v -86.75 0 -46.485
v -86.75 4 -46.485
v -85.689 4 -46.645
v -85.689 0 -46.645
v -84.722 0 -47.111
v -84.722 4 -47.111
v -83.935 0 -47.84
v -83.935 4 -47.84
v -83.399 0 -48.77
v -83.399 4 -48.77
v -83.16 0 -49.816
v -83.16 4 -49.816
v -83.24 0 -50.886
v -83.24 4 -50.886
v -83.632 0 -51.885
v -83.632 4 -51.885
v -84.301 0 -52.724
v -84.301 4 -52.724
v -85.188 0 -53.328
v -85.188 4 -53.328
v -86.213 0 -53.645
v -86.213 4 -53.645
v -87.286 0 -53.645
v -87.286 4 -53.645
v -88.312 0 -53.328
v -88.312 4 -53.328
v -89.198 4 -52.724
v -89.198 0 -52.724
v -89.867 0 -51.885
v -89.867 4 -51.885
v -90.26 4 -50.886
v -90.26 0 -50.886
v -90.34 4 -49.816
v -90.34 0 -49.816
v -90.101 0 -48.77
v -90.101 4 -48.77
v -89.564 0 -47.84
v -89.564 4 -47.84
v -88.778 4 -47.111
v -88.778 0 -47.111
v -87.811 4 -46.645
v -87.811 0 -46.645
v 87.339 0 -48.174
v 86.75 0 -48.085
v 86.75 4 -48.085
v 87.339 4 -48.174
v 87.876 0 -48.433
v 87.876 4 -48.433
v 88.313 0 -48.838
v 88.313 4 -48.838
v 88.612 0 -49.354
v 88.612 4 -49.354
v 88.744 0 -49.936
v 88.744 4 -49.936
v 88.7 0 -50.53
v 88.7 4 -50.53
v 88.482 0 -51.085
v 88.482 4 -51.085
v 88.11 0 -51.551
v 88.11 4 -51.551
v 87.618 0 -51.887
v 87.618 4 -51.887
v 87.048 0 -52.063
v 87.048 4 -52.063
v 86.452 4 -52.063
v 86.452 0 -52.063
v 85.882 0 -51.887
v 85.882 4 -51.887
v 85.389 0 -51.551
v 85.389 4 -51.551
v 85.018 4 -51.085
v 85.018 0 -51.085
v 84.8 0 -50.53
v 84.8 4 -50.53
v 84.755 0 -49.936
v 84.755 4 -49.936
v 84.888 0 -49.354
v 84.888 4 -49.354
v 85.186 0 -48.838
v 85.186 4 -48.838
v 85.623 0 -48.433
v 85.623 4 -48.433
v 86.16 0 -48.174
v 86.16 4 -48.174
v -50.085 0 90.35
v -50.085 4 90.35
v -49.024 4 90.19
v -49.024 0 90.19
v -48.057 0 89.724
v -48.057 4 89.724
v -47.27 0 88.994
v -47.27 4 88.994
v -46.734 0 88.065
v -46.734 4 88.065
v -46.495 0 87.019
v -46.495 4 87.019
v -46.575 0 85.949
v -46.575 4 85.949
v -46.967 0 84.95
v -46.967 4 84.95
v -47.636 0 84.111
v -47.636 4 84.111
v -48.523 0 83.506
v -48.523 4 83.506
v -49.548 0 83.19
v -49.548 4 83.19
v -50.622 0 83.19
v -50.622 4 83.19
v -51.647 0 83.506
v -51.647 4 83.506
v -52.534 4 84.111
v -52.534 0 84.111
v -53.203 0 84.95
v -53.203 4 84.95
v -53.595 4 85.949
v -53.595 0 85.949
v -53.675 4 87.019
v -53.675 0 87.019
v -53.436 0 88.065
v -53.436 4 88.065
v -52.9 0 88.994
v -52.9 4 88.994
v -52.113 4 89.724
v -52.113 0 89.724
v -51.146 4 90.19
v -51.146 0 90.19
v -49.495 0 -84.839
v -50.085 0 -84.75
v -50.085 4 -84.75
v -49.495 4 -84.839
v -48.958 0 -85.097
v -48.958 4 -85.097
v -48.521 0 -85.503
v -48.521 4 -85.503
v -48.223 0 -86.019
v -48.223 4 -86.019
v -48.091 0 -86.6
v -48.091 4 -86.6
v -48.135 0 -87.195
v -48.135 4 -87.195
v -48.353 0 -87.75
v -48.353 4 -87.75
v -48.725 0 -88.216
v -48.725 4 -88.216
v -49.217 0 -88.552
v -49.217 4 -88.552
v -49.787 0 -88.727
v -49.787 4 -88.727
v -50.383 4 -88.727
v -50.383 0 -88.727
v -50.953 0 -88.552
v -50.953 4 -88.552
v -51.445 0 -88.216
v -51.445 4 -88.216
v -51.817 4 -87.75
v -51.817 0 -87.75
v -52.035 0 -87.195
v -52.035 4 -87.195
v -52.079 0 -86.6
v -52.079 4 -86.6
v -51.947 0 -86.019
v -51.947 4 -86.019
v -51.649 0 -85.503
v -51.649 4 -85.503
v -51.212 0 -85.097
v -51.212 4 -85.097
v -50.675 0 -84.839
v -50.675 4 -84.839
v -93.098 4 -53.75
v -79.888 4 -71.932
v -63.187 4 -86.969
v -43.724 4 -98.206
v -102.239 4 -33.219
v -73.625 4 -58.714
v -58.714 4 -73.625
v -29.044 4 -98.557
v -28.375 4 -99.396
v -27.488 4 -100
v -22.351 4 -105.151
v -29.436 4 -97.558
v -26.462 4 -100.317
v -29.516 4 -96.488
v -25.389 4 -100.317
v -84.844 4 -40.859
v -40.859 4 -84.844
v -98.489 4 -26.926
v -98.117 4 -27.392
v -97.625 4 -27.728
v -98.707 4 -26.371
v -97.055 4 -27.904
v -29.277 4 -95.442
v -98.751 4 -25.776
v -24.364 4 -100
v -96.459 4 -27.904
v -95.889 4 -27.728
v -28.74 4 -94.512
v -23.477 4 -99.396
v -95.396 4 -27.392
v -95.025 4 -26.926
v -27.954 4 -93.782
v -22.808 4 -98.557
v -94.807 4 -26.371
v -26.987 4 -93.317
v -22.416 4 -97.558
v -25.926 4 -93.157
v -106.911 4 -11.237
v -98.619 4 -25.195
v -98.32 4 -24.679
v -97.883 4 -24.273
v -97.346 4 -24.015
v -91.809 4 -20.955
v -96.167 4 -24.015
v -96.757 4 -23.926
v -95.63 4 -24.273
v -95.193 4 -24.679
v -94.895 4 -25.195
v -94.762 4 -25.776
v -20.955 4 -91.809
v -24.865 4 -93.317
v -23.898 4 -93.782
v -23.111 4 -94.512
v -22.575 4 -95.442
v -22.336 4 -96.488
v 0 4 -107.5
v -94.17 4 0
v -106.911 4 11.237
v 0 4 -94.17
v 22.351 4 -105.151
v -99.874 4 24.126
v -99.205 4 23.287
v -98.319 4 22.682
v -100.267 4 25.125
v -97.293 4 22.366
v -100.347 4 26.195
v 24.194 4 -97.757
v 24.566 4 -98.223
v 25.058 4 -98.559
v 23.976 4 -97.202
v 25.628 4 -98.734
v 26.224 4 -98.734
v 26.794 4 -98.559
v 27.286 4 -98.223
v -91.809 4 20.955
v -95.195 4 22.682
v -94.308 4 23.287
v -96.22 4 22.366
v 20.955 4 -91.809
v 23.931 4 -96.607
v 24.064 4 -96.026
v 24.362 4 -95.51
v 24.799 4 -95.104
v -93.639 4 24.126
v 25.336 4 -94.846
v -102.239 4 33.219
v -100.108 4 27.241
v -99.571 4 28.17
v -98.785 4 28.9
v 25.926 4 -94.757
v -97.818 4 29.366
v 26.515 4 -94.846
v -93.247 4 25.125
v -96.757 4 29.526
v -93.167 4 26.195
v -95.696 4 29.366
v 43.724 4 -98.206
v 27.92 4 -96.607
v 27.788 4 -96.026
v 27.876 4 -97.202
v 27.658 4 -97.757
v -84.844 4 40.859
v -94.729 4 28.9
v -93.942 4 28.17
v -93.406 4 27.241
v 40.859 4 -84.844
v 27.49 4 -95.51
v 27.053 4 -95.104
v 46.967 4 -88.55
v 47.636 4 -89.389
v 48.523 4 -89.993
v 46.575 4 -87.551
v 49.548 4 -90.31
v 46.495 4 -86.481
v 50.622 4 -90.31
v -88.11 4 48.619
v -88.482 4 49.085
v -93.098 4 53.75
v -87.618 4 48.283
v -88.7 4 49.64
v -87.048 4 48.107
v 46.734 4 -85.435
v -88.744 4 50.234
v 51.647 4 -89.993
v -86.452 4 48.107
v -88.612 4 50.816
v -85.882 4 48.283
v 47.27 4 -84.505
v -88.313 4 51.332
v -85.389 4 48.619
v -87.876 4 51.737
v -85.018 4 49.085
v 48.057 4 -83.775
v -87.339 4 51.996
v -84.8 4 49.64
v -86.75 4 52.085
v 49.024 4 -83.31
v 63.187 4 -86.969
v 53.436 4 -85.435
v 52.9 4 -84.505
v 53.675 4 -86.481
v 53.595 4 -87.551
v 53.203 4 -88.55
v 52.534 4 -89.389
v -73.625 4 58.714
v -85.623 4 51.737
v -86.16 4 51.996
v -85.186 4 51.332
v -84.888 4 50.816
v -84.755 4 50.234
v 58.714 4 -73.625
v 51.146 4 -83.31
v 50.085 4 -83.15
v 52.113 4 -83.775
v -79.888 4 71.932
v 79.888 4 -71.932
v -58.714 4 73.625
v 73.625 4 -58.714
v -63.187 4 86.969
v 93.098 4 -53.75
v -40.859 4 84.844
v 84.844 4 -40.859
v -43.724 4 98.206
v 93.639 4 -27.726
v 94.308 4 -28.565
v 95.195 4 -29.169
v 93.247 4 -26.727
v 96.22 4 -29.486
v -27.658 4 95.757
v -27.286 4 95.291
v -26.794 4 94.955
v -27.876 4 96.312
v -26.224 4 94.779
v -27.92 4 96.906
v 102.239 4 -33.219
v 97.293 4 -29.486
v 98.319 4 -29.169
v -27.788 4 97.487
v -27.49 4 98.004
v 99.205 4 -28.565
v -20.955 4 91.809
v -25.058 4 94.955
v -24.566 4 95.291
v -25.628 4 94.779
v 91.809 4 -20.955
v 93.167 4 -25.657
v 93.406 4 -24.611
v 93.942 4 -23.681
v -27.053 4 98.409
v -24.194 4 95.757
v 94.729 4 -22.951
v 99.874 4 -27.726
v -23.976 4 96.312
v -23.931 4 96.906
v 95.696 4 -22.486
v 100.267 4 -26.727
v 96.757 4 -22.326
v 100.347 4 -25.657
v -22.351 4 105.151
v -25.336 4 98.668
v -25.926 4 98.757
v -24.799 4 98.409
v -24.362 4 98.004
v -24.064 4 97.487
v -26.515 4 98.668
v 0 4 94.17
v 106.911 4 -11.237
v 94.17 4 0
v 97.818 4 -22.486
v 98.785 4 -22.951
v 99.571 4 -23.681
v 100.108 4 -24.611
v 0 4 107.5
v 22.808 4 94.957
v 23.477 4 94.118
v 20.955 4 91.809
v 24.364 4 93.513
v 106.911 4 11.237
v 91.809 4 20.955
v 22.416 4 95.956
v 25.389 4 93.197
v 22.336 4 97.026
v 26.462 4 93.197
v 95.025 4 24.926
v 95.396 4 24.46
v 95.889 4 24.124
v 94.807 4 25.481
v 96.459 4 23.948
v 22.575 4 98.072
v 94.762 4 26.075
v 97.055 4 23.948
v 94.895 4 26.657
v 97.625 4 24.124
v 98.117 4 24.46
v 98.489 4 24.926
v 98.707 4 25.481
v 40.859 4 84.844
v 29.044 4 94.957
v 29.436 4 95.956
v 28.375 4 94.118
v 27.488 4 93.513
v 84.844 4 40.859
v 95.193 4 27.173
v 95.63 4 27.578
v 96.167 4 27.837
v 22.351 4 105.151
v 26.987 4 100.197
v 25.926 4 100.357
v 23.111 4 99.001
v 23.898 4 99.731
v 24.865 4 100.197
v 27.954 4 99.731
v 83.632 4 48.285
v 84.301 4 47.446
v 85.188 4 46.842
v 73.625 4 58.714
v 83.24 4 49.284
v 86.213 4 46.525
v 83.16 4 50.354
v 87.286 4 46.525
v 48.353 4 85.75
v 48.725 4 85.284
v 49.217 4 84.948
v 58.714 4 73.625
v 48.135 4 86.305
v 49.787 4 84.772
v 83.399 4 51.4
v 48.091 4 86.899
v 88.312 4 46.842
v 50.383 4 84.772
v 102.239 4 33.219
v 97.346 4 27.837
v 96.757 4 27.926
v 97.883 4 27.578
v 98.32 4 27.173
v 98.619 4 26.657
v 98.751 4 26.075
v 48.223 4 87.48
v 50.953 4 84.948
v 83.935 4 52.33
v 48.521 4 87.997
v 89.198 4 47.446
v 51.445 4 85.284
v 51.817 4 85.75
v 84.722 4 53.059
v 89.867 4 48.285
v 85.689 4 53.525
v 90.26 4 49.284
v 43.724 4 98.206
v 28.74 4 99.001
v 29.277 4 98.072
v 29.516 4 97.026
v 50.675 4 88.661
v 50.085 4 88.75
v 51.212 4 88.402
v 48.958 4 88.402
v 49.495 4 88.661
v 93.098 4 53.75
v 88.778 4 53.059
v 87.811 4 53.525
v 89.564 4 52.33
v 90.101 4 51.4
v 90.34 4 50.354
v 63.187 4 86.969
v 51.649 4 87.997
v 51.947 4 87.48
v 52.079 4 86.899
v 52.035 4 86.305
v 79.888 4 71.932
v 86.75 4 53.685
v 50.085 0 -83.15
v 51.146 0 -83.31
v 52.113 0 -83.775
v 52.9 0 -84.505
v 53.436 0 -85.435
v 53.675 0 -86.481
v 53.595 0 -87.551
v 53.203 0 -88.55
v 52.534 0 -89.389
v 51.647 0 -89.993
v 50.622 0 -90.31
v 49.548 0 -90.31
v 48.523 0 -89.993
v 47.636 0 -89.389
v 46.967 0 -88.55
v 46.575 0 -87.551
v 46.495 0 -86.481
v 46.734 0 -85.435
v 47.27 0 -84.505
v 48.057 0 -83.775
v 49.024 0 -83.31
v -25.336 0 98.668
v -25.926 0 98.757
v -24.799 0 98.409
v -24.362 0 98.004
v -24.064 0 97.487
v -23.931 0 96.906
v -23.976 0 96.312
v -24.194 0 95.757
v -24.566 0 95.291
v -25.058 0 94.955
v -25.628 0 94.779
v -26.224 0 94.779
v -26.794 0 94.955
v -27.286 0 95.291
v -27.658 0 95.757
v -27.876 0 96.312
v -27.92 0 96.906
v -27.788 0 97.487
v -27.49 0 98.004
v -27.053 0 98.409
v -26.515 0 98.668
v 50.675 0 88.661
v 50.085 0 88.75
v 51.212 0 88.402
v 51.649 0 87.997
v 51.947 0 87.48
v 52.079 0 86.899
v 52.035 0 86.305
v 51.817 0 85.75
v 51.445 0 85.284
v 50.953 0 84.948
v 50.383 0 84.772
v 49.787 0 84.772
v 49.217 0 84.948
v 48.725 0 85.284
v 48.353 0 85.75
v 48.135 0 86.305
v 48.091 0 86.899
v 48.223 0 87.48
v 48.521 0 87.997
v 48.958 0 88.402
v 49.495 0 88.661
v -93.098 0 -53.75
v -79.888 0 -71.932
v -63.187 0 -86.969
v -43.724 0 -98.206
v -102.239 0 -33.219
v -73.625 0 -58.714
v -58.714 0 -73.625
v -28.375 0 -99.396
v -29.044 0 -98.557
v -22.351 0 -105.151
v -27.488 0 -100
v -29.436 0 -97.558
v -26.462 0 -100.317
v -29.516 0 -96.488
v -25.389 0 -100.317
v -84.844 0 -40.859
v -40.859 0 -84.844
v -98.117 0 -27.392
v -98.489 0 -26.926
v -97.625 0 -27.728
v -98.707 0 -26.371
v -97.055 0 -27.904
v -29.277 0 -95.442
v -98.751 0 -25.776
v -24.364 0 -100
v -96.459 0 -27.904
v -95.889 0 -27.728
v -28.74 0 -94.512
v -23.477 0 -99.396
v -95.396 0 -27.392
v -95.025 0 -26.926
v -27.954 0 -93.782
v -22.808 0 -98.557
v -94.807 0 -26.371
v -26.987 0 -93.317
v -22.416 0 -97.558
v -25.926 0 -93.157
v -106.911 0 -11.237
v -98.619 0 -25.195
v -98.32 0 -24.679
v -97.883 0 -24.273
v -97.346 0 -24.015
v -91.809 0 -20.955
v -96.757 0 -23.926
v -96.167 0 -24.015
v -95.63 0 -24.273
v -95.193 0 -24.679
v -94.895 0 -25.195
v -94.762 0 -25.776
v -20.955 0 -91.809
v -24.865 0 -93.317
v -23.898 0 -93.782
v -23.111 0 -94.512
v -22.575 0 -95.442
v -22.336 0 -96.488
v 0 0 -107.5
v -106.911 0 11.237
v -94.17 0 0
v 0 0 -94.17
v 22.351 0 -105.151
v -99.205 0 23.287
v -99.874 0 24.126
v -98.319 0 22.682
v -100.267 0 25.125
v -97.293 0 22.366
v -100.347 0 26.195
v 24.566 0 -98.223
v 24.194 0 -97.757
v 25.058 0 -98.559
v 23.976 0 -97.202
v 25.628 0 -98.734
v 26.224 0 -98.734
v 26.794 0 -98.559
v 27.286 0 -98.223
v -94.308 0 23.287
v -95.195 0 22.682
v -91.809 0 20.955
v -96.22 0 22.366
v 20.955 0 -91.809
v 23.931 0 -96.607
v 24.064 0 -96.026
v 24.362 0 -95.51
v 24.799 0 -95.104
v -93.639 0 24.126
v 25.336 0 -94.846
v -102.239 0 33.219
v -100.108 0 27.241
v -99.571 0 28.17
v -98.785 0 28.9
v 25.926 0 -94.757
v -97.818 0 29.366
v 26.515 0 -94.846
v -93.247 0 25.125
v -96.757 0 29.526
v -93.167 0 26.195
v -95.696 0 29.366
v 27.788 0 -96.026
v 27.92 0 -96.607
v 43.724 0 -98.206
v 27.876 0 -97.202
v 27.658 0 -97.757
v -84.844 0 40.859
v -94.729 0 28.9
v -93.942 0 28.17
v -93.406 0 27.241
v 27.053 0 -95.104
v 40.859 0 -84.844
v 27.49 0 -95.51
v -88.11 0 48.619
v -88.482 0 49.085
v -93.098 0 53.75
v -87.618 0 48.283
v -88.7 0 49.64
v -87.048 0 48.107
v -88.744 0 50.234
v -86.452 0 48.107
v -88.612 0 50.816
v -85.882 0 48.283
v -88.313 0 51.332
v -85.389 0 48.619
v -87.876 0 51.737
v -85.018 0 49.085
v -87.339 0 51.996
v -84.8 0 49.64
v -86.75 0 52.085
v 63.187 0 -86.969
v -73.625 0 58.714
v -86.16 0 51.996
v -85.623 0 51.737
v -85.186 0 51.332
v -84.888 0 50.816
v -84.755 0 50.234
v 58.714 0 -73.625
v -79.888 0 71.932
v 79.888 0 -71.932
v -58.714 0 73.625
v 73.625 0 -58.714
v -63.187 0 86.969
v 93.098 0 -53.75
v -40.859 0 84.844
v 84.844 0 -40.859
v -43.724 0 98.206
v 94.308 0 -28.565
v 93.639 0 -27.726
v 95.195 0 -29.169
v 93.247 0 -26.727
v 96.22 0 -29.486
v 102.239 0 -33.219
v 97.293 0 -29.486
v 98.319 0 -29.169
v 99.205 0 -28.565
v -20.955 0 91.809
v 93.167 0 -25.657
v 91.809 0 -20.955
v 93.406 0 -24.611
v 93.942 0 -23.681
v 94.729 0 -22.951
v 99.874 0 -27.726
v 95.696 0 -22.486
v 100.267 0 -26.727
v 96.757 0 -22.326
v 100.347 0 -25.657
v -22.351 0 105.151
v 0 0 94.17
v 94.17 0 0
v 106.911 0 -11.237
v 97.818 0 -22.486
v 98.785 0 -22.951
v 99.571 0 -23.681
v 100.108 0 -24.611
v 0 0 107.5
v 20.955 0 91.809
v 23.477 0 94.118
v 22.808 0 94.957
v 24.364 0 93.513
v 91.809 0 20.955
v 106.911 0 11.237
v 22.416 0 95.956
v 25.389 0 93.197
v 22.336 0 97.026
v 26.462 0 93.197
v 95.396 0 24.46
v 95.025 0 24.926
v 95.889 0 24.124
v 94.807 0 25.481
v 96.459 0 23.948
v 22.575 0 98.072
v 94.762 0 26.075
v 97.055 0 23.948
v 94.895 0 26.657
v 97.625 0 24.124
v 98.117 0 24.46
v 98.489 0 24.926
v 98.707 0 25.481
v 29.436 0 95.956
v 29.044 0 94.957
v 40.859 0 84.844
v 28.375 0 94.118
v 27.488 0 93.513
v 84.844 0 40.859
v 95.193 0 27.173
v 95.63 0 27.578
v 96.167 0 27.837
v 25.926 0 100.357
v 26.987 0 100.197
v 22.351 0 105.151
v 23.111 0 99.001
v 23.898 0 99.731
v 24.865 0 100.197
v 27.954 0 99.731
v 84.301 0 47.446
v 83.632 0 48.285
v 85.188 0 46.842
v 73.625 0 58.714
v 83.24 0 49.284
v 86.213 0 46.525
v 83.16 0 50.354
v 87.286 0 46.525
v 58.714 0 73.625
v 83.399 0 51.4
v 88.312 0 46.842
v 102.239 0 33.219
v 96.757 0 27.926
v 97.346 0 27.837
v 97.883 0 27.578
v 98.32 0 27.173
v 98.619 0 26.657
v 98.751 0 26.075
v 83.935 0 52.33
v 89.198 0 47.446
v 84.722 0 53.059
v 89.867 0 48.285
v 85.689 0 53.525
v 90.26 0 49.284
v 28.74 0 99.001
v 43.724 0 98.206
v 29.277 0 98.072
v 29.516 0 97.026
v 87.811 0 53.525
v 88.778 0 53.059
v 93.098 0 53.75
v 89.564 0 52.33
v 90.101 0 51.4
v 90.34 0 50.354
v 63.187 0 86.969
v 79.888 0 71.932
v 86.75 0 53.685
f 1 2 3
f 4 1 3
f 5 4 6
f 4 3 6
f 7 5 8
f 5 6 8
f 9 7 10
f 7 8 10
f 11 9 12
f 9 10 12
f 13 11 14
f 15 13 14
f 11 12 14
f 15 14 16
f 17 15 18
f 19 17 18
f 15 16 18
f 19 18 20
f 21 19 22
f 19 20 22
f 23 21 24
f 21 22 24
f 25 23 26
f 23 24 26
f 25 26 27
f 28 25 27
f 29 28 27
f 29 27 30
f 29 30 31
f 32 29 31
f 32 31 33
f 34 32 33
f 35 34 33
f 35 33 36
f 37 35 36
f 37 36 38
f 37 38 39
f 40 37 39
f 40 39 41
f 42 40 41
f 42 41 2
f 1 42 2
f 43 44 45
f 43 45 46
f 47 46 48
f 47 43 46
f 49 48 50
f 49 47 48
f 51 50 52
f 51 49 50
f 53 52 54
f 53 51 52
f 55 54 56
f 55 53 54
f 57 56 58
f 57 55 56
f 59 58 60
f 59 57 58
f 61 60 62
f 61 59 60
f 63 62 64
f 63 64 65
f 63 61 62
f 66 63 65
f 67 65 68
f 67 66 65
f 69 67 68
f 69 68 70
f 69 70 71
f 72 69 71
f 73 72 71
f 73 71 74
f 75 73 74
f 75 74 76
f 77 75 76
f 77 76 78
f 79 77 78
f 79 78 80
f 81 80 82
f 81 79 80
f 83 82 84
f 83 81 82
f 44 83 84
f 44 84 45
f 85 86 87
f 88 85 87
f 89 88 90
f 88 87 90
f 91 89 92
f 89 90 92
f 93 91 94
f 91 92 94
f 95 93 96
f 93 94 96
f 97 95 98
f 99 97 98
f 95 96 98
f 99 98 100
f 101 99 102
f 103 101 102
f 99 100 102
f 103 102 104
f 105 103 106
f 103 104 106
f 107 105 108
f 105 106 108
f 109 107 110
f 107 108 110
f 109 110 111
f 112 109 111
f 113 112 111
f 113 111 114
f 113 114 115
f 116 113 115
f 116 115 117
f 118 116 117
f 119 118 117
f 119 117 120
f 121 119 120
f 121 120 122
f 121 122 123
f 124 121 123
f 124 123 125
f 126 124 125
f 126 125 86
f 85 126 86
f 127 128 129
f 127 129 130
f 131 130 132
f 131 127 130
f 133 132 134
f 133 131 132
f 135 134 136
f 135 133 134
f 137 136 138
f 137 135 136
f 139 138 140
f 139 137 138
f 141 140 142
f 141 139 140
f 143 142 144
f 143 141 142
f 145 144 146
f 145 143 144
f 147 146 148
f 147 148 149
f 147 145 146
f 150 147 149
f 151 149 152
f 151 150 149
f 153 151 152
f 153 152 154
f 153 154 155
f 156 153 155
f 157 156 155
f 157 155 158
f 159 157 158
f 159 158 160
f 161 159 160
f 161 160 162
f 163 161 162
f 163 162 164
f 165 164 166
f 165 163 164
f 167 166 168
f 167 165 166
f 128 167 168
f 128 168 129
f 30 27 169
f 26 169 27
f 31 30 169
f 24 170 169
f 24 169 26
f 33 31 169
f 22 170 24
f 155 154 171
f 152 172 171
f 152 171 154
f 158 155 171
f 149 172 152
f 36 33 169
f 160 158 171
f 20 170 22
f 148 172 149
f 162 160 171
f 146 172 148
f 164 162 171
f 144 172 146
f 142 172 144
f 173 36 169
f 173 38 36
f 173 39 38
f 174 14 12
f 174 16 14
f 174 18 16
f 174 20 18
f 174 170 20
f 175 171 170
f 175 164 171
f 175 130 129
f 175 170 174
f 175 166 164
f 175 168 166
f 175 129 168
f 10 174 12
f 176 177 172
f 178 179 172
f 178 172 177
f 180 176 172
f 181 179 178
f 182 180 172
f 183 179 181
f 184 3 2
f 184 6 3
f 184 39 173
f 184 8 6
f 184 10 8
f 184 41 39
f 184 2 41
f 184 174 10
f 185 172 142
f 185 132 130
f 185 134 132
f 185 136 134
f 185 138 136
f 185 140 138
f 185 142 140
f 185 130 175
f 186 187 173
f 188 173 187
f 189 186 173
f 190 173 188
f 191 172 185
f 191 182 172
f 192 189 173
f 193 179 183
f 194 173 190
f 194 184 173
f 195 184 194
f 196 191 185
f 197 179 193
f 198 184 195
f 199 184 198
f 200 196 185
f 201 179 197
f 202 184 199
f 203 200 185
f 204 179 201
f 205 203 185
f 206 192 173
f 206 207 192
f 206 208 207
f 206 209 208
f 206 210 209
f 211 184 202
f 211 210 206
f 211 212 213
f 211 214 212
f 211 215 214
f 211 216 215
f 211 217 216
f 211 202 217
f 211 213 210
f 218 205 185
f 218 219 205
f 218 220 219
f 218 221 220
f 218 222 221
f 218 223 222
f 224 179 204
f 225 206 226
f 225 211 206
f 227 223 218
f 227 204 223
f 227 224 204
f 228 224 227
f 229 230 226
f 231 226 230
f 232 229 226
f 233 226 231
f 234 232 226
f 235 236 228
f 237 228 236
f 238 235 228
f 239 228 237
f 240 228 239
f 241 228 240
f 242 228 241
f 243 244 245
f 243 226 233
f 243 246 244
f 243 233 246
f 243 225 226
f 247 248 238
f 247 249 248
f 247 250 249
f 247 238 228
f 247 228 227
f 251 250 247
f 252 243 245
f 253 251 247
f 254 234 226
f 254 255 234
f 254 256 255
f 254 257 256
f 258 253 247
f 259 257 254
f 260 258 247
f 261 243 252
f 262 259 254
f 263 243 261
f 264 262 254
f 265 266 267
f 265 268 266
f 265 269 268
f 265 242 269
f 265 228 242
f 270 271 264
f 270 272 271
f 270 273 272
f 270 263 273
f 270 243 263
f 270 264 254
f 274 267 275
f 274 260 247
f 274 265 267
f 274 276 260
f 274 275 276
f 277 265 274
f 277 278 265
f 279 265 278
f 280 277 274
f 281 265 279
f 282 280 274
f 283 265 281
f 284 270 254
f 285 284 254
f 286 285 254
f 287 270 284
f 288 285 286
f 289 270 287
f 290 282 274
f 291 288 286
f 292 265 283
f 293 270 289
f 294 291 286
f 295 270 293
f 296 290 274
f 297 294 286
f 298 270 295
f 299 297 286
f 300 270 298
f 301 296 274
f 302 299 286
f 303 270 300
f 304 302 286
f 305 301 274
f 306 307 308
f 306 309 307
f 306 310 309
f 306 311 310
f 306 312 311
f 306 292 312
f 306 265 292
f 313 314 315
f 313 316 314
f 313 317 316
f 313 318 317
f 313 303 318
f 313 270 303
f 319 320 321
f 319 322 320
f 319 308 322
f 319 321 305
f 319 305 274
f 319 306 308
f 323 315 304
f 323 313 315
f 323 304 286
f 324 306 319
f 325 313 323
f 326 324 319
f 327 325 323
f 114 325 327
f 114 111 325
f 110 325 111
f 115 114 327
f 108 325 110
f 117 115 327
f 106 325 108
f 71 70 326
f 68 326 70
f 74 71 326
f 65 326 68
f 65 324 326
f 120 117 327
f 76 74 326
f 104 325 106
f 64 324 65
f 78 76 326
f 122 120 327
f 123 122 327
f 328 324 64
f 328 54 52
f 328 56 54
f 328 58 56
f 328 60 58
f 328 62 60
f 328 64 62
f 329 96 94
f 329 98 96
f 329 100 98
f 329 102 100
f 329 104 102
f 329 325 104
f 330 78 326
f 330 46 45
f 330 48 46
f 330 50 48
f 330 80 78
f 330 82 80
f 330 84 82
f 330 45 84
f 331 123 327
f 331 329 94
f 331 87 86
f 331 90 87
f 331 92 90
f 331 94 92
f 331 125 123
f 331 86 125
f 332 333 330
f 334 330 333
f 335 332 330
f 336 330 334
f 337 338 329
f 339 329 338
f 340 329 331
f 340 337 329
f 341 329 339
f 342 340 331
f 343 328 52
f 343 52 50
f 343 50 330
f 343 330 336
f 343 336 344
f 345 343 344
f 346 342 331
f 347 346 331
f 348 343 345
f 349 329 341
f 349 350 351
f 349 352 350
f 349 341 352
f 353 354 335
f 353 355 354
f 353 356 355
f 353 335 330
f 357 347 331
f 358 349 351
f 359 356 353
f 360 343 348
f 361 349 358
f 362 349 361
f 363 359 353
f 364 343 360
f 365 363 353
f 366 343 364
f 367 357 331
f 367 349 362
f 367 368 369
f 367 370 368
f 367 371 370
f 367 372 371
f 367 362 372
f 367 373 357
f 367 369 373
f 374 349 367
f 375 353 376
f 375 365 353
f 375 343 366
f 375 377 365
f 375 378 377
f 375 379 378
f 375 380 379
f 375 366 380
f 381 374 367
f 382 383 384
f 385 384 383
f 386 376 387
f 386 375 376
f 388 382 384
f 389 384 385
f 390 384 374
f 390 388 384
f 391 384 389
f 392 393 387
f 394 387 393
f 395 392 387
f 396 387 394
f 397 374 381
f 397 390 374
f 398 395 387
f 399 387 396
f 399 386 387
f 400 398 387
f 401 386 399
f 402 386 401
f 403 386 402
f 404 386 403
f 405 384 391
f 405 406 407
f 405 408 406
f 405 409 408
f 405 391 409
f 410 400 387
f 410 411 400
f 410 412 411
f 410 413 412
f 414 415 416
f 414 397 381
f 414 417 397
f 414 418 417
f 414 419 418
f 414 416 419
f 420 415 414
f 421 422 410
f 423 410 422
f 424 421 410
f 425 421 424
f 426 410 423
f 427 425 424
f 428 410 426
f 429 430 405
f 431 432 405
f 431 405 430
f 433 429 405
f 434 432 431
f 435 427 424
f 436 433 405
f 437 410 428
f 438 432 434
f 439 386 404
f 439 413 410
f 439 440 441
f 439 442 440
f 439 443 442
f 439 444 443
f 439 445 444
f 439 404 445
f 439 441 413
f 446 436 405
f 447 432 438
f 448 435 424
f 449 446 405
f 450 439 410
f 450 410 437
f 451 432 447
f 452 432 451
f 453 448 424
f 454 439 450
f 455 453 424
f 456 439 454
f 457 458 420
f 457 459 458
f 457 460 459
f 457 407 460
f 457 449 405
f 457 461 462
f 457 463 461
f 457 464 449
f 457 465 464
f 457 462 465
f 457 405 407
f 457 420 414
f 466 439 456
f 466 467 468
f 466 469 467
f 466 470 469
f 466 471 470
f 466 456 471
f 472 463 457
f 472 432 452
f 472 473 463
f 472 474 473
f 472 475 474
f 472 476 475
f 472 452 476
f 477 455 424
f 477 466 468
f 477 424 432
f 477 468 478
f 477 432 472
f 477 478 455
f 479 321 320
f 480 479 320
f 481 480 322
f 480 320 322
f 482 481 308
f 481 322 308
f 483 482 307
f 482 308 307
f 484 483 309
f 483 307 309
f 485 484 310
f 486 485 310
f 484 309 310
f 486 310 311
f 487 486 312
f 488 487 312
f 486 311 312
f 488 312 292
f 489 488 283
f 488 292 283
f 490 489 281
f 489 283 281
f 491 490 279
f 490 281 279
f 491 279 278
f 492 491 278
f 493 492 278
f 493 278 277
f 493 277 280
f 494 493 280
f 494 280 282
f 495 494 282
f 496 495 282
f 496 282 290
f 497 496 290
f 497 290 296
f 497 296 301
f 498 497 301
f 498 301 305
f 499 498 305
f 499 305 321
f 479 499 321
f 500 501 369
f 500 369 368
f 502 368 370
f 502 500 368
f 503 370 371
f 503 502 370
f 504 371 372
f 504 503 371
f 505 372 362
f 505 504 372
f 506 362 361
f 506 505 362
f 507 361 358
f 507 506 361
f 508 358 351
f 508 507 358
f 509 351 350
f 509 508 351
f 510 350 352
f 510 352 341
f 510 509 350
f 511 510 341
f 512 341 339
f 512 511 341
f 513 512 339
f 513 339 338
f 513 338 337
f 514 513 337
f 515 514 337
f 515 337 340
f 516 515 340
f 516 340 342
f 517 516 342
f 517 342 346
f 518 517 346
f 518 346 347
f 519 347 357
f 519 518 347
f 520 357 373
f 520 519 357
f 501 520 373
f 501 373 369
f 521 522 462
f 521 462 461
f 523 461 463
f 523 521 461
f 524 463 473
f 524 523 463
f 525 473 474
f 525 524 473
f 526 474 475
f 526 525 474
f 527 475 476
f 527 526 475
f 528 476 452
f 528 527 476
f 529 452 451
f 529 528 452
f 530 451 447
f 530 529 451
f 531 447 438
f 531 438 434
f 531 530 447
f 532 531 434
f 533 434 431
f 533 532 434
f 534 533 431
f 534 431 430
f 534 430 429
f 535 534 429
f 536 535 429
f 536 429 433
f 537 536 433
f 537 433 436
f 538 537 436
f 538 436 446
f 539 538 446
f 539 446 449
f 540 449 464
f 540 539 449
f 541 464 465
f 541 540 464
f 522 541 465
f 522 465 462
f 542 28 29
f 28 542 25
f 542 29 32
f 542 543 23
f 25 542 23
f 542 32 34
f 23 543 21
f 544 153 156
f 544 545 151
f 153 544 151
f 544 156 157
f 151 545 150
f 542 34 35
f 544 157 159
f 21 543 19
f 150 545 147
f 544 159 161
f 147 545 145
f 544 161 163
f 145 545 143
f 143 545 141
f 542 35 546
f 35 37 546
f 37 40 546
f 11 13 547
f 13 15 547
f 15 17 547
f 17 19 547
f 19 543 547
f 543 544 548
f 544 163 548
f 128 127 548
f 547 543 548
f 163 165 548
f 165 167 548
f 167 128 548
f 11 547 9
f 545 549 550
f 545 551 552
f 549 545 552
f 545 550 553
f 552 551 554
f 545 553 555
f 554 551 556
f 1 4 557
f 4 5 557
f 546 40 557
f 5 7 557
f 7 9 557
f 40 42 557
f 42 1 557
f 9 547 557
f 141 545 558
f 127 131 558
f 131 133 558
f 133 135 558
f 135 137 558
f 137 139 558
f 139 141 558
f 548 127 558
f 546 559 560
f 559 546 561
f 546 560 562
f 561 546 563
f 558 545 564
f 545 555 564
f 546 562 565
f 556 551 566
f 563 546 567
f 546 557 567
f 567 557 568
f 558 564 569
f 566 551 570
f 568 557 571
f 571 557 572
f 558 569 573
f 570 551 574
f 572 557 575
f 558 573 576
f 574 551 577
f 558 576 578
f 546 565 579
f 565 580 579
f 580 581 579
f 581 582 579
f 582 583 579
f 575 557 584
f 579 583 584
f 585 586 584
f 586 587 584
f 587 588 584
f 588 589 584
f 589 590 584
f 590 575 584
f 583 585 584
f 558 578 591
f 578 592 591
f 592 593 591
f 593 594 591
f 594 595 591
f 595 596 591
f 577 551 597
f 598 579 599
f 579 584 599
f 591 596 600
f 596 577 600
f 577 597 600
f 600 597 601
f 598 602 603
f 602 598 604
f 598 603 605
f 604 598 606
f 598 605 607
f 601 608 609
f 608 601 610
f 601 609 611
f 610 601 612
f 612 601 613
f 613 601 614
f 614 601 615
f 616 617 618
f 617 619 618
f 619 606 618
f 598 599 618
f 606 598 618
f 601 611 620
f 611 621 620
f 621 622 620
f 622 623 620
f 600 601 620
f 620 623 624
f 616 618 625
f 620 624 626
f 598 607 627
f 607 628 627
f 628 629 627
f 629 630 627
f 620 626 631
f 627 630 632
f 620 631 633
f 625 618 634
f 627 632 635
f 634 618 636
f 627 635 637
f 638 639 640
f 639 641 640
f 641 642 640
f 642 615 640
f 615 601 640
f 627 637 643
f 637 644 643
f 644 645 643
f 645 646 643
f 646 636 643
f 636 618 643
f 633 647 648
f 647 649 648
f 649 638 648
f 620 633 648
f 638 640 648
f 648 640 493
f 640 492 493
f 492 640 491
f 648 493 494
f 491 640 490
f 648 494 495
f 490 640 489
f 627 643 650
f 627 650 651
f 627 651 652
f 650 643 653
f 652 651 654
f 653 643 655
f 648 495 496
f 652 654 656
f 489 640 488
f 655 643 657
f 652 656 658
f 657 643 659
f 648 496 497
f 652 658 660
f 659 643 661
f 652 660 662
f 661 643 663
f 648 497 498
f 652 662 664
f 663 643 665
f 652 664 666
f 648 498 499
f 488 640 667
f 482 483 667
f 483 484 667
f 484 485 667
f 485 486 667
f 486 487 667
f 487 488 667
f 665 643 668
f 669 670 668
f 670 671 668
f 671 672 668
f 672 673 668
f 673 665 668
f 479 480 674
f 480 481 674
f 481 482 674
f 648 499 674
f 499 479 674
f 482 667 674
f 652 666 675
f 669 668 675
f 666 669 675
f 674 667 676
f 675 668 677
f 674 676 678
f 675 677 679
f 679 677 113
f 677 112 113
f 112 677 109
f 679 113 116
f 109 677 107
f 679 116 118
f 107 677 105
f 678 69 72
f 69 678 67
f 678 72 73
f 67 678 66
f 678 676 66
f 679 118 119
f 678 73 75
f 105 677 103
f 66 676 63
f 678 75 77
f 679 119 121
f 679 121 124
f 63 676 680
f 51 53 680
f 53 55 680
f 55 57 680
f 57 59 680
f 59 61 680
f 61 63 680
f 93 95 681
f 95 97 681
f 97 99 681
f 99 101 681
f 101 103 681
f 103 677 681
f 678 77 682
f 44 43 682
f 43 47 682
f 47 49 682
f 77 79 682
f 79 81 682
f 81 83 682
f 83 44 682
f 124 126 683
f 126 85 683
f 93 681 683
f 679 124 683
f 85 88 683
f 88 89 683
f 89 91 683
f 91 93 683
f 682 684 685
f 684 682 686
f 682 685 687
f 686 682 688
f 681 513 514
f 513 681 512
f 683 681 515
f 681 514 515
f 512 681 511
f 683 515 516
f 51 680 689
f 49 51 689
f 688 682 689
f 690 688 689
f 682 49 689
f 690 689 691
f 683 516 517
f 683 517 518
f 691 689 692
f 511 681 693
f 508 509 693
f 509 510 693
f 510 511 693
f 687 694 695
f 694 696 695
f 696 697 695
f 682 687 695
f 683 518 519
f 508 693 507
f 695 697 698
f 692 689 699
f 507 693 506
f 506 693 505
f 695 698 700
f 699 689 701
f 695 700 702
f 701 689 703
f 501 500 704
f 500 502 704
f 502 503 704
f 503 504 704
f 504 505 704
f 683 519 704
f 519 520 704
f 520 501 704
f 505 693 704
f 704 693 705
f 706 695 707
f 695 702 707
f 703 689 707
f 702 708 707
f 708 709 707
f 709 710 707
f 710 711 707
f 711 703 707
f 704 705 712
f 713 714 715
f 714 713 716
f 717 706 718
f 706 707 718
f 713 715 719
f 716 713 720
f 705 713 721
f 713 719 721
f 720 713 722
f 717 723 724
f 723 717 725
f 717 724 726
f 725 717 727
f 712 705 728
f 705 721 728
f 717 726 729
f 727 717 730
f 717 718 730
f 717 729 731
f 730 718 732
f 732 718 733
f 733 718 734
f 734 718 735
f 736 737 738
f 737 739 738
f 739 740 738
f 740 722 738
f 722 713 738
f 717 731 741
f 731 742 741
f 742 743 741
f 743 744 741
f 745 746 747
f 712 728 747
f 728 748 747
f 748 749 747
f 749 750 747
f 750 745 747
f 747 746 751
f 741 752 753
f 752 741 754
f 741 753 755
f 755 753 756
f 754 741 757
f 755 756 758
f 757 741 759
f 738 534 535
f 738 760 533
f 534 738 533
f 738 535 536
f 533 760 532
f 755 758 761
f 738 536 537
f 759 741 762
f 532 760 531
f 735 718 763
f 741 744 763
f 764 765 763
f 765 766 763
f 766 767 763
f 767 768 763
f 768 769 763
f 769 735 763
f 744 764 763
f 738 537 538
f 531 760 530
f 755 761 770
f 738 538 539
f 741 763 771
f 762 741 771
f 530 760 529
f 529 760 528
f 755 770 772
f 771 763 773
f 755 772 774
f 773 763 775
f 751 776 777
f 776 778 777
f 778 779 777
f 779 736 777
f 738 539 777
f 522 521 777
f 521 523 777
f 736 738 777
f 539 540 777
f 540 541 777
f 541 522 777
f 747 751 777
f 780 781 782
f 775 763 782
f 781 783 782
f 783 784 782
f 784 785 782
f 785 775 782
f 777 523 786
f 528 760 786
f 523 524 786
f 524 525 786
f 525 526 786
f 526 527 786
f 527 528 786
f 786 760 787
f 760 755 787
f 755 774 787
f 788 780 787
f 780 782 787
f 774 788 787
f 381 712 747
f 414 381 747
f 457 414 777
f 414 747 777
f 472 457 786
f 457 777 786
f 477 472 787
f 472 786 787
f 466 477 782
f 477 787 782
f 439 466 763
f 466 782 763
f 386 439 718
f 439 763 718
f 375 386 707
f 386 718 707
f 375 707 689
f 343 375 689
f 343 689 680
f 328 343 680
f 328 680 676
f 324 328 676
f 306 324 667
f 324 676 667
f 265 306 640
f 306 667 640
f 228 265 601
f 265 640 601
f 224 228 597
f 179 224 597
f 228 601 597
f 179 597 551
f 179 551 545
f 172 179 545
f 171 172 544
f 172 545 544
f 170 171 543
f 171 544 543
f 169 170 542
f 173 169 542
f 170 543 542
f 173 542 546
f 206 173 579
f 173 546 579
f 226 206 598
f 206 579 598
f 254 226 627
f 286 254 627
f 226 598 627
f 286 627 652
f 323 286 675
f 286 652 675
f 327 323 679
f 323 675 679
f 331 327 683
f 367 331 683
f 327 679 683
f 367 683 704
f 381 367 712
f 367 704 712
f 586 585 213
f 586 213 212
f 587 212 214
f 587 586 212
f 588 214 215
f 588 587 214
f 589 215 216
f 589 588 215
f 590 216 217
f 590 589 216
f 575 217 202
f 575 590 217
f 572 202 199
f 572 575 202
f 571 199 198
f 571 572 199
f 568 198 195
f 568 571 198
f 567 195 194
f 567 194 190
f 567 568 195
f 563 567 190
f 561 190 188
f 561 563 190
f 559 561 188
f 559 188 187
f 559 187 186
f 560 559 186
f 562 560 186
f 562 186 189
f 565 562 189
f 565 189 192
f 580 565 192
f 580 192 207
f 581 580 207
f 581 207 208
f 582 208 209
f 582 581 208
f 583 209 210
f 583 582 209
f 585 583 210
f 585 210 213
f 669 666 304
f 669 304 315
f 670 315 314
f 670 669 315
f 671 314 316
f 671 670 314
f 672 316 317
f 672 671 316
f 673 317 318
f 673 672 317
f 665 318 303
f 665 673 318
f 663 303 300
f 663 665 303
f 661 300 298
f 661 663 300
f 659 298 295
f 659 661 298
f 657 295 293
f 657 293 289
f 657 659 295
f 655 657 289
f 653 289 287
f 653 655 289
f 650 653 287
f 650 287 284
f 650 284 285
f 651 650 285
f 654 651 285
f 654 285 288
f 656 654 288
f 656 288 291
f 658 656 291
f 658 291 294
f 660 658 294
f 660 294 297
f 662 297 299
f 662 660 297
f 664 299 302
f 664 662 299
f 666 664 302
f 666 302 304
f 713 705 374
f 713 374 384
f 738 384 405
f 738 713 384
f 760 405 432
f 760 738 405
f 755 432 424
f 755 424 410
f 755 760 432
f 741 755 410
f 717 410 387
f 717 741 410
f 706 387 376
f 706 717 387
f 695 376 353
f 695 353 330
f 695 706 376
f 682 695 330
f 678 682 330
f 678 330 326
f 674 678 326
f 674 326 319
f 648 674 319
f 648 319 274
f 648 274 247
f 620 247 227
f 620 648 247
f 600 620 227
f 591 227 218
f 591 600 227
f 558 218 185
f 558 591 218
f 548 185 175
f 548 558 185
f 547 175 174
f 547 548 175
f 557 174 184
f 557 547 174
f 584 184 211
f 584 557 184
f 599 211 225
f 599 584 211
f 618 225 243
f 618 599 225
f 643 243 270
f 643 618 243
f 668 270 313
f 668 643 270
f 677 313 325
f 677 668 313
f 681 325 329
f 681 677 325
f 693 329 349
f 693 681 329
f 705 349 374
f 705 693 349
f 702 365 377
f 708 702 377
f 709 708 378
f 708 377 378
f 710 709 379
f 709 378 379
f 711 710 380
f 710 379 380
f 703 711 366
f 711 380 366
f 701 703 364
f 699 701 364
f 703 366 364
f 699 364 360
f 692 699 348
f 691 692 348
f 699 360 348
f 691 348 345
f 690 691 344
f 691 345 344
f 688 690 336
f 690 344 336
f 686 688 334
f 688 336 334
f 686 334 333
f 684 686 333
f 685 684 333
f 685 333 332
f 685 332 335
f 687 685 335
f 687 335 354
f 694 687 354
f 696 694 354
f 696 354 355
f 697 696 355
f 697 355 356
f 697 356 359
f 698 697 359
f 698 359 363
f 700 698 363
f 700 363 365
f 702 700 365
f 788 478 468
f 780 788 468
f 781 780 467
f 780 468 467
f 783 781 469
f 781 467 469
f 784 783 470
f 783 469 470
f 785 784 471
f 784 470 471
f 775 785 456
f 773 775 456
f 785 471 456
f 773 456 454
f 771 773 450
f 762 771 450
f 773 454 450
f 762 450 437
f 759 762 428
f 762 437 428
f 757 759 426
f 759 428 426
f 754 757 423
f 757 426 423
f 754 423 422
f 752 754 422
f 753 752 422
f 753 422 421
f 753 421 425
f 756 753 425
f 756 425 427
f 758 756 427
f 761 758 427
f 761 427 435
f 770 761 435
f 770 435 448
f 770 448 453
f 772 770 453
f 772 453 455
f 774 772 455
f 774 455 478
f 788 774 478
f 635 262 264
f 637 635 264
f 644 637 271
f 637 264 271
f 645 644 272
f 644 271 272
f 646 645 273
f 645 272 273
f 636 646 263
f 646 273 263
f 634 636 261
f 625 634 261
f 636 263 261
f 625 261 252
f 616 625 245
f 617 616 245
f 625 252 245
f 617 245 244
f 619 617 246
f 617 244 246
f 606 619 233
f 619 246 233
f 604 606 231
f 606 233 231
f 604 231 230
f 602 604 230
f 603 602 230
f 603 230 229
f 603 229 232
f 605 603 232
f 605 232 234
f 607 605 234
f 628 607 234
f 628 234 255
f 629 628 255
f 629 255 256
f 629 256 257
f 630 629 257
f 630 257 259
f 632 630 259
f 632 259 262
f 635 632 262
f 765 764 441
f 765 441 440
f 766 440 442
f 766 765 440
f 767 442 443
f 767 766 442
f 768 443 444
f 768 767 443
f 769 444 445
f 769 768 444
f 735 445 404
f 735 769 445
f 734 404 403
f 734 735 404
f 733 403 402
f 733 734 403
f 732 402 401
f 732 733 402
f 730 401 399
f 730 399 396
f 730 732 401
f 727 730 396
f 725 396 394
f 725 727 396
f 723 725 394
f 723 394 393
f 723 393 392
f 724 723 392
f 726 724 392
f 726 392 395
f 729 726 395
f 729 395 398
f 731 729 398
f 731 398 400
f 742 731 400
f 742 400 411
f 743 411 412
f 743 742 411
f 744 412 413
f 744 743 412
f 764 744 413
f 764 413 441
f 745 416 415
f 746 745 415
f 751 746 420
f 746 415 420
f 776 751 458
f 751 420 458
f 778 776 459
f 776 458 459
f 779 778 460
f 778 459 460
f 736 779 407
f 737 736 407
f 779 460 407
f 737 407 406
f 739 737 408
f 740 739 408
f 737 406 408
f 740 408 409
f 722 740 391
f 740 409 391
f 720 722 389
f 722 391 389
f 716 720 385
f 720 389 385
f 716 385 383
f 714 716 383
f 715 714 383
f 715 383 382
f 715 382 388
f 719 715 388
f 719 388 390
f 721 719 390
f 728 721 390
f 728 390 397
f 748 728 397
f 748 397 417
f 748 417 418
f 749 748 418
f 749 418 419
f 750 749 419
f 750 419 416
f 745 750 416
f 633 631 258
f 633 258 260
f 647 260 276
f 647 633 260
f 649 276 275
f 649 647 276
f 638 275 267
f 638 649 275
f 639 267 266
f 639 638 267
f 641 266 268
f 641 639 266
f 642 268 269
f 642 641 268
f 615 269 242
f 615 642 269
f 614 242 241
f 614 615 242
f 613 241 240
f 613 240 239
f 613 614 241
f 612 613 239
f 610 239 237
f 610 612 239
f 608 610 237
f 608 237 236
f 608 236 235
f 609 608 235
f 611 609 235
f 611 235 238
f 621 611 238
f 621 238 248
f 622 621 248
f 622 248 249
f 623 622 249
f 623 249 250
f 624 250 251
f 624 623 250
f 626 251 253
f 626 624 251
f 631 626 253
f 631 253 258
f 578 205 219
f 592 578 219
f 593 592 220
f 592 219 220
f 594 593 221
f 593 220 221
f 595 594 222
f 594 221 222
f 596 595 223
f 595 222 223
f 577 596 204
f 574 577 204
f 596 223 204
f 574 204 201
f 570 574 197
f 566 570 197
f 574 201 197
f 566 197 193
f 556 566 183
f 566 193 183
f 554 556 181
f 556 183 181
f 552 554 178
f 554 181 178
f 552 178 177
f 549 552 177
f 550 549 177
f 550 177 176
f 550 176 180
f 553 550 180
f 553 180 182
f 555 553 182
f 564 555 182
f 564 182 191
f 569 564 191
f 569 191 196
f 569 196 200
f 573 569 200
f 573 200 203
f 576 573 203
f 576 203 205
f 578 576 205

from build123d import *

# Parameters (mm, degrees)
SKETCH1_R           = 107.5
SKETCH1_R_2         = 94.17
SKETCH1_R_3         = 2
BOSS_EXTRUDE1_DEPTH = 4
SKETCH2_R           = 3.6
CUT_EXTRUDE1_DEPTH  = 10


with BuildPart() as part:
    # Sketch1 → Boss-Extrude1 (new body)
    with BuildSketch(Plane(origin=(0, 0, 0), x_dir=(1, 0, 0), z_dir=(0, 1, 0))):
        with Locations(Location((0, 0, 0), (0, 0, 270))):
            Circle(SKETCH1_R)
        with Locations(Location((0, 0, 0), (0, 0, 270))):
            Circle(SKETCH1_R_2, mode=Mode.SUBTRACT)
        with Locations(Location((86.749764697, 50.085, 0), (0, 0, 270))):
            Circle(SKETCH1_R_3, mode=Mode.SUBTRACT)
        with Locations(Location((96.756790019, -25.925903748, 0), (0, 0, 270))):
            Circle(SKETCH1_R_3, mode=Mode.SUBTRACT)
        with Locations(Location((50.085, -86.749764697, 0), (0, 0, 270))):
            Circle(SKETCH1_R_3, mode=Mode.SUBTRACT)
        with Locations(Location((-25.925903748, -96.756790019, 0), (0, 0, 270))):
            Circle(SKETCH1_R_3, mode=Mode.SUBTRACT)
        with Locations(Location((-86.749764697, -50.085, 0), (0, 0, 270))):
            Circle(SKETCH1_R_3, mode=Mode.SUBTRACT)
        with Locations(Location((-96.756790019, 25.925903748, 0), (0, 0, 270))):
            Circle(SKETCH1_R_3, mode=Mode.SUBTRACT)
        with Locations(Location((-50.085, 86.749764697, 0), (0, 0, 270))):
            Circle(SKETCH1_R_3, mode=Mode.SUBTRACT)
        with Locations(Location((25.925903748, 96.756790019, 0), (0, 0, 270))):
            Circle(SKETCH1_R_3, mode=Mode.SUBTRACT)
    extrude(amount=BOSS_EXTRUDE1_DEPTH)

    # Sketch2 → Cut-Extrude1 (cut)
    with BuildSketch(Plane(origin=(0, 4, 0), x_dir=(1, 0, 0), z_dir=(0, 1, 0))):
        with Locations(Location((96.756790019, 25.925903748, 0), (0, 0, 270))):
            Circle(SKETCH2_R)
        with Locations(Location((86.749764697, -50.085, 0), (0, 0, 270))):
            Circle(SKETCH2_R)
        with Locations(Location((25.925903748, -96.756790019, 0), (0, 0, 270))):
            Circle(SKETCH2_R)
        with Locations(Location((-50.085, -86.749764697, 0), (0, 0, 270))):
            Circle(SKETCH2_R)
        with Locations(Location((-96.756790019, -25.925903748, 0), (0, 0, 270))):
            Circle(SKETCH2_R)
        with Locations(Location((-86.749764697, 50.085, 0), (0, 0, 270))):
            Circle(SKETCH2_R)
        with Locations(Location((-25.925903748, 96.756790019, 0), (0, 0, 270))):
            Circle(SKETCH2_R)
        with Locations(Location((50.085, 86.749764697, 0), (0, 0, 270))):
            Circle(SKETCH2_R)
    extrude(amount=-CUT_EXTRUDE1_DEPTH, mode=Mode.SUBTRACT)


solid = part.part
